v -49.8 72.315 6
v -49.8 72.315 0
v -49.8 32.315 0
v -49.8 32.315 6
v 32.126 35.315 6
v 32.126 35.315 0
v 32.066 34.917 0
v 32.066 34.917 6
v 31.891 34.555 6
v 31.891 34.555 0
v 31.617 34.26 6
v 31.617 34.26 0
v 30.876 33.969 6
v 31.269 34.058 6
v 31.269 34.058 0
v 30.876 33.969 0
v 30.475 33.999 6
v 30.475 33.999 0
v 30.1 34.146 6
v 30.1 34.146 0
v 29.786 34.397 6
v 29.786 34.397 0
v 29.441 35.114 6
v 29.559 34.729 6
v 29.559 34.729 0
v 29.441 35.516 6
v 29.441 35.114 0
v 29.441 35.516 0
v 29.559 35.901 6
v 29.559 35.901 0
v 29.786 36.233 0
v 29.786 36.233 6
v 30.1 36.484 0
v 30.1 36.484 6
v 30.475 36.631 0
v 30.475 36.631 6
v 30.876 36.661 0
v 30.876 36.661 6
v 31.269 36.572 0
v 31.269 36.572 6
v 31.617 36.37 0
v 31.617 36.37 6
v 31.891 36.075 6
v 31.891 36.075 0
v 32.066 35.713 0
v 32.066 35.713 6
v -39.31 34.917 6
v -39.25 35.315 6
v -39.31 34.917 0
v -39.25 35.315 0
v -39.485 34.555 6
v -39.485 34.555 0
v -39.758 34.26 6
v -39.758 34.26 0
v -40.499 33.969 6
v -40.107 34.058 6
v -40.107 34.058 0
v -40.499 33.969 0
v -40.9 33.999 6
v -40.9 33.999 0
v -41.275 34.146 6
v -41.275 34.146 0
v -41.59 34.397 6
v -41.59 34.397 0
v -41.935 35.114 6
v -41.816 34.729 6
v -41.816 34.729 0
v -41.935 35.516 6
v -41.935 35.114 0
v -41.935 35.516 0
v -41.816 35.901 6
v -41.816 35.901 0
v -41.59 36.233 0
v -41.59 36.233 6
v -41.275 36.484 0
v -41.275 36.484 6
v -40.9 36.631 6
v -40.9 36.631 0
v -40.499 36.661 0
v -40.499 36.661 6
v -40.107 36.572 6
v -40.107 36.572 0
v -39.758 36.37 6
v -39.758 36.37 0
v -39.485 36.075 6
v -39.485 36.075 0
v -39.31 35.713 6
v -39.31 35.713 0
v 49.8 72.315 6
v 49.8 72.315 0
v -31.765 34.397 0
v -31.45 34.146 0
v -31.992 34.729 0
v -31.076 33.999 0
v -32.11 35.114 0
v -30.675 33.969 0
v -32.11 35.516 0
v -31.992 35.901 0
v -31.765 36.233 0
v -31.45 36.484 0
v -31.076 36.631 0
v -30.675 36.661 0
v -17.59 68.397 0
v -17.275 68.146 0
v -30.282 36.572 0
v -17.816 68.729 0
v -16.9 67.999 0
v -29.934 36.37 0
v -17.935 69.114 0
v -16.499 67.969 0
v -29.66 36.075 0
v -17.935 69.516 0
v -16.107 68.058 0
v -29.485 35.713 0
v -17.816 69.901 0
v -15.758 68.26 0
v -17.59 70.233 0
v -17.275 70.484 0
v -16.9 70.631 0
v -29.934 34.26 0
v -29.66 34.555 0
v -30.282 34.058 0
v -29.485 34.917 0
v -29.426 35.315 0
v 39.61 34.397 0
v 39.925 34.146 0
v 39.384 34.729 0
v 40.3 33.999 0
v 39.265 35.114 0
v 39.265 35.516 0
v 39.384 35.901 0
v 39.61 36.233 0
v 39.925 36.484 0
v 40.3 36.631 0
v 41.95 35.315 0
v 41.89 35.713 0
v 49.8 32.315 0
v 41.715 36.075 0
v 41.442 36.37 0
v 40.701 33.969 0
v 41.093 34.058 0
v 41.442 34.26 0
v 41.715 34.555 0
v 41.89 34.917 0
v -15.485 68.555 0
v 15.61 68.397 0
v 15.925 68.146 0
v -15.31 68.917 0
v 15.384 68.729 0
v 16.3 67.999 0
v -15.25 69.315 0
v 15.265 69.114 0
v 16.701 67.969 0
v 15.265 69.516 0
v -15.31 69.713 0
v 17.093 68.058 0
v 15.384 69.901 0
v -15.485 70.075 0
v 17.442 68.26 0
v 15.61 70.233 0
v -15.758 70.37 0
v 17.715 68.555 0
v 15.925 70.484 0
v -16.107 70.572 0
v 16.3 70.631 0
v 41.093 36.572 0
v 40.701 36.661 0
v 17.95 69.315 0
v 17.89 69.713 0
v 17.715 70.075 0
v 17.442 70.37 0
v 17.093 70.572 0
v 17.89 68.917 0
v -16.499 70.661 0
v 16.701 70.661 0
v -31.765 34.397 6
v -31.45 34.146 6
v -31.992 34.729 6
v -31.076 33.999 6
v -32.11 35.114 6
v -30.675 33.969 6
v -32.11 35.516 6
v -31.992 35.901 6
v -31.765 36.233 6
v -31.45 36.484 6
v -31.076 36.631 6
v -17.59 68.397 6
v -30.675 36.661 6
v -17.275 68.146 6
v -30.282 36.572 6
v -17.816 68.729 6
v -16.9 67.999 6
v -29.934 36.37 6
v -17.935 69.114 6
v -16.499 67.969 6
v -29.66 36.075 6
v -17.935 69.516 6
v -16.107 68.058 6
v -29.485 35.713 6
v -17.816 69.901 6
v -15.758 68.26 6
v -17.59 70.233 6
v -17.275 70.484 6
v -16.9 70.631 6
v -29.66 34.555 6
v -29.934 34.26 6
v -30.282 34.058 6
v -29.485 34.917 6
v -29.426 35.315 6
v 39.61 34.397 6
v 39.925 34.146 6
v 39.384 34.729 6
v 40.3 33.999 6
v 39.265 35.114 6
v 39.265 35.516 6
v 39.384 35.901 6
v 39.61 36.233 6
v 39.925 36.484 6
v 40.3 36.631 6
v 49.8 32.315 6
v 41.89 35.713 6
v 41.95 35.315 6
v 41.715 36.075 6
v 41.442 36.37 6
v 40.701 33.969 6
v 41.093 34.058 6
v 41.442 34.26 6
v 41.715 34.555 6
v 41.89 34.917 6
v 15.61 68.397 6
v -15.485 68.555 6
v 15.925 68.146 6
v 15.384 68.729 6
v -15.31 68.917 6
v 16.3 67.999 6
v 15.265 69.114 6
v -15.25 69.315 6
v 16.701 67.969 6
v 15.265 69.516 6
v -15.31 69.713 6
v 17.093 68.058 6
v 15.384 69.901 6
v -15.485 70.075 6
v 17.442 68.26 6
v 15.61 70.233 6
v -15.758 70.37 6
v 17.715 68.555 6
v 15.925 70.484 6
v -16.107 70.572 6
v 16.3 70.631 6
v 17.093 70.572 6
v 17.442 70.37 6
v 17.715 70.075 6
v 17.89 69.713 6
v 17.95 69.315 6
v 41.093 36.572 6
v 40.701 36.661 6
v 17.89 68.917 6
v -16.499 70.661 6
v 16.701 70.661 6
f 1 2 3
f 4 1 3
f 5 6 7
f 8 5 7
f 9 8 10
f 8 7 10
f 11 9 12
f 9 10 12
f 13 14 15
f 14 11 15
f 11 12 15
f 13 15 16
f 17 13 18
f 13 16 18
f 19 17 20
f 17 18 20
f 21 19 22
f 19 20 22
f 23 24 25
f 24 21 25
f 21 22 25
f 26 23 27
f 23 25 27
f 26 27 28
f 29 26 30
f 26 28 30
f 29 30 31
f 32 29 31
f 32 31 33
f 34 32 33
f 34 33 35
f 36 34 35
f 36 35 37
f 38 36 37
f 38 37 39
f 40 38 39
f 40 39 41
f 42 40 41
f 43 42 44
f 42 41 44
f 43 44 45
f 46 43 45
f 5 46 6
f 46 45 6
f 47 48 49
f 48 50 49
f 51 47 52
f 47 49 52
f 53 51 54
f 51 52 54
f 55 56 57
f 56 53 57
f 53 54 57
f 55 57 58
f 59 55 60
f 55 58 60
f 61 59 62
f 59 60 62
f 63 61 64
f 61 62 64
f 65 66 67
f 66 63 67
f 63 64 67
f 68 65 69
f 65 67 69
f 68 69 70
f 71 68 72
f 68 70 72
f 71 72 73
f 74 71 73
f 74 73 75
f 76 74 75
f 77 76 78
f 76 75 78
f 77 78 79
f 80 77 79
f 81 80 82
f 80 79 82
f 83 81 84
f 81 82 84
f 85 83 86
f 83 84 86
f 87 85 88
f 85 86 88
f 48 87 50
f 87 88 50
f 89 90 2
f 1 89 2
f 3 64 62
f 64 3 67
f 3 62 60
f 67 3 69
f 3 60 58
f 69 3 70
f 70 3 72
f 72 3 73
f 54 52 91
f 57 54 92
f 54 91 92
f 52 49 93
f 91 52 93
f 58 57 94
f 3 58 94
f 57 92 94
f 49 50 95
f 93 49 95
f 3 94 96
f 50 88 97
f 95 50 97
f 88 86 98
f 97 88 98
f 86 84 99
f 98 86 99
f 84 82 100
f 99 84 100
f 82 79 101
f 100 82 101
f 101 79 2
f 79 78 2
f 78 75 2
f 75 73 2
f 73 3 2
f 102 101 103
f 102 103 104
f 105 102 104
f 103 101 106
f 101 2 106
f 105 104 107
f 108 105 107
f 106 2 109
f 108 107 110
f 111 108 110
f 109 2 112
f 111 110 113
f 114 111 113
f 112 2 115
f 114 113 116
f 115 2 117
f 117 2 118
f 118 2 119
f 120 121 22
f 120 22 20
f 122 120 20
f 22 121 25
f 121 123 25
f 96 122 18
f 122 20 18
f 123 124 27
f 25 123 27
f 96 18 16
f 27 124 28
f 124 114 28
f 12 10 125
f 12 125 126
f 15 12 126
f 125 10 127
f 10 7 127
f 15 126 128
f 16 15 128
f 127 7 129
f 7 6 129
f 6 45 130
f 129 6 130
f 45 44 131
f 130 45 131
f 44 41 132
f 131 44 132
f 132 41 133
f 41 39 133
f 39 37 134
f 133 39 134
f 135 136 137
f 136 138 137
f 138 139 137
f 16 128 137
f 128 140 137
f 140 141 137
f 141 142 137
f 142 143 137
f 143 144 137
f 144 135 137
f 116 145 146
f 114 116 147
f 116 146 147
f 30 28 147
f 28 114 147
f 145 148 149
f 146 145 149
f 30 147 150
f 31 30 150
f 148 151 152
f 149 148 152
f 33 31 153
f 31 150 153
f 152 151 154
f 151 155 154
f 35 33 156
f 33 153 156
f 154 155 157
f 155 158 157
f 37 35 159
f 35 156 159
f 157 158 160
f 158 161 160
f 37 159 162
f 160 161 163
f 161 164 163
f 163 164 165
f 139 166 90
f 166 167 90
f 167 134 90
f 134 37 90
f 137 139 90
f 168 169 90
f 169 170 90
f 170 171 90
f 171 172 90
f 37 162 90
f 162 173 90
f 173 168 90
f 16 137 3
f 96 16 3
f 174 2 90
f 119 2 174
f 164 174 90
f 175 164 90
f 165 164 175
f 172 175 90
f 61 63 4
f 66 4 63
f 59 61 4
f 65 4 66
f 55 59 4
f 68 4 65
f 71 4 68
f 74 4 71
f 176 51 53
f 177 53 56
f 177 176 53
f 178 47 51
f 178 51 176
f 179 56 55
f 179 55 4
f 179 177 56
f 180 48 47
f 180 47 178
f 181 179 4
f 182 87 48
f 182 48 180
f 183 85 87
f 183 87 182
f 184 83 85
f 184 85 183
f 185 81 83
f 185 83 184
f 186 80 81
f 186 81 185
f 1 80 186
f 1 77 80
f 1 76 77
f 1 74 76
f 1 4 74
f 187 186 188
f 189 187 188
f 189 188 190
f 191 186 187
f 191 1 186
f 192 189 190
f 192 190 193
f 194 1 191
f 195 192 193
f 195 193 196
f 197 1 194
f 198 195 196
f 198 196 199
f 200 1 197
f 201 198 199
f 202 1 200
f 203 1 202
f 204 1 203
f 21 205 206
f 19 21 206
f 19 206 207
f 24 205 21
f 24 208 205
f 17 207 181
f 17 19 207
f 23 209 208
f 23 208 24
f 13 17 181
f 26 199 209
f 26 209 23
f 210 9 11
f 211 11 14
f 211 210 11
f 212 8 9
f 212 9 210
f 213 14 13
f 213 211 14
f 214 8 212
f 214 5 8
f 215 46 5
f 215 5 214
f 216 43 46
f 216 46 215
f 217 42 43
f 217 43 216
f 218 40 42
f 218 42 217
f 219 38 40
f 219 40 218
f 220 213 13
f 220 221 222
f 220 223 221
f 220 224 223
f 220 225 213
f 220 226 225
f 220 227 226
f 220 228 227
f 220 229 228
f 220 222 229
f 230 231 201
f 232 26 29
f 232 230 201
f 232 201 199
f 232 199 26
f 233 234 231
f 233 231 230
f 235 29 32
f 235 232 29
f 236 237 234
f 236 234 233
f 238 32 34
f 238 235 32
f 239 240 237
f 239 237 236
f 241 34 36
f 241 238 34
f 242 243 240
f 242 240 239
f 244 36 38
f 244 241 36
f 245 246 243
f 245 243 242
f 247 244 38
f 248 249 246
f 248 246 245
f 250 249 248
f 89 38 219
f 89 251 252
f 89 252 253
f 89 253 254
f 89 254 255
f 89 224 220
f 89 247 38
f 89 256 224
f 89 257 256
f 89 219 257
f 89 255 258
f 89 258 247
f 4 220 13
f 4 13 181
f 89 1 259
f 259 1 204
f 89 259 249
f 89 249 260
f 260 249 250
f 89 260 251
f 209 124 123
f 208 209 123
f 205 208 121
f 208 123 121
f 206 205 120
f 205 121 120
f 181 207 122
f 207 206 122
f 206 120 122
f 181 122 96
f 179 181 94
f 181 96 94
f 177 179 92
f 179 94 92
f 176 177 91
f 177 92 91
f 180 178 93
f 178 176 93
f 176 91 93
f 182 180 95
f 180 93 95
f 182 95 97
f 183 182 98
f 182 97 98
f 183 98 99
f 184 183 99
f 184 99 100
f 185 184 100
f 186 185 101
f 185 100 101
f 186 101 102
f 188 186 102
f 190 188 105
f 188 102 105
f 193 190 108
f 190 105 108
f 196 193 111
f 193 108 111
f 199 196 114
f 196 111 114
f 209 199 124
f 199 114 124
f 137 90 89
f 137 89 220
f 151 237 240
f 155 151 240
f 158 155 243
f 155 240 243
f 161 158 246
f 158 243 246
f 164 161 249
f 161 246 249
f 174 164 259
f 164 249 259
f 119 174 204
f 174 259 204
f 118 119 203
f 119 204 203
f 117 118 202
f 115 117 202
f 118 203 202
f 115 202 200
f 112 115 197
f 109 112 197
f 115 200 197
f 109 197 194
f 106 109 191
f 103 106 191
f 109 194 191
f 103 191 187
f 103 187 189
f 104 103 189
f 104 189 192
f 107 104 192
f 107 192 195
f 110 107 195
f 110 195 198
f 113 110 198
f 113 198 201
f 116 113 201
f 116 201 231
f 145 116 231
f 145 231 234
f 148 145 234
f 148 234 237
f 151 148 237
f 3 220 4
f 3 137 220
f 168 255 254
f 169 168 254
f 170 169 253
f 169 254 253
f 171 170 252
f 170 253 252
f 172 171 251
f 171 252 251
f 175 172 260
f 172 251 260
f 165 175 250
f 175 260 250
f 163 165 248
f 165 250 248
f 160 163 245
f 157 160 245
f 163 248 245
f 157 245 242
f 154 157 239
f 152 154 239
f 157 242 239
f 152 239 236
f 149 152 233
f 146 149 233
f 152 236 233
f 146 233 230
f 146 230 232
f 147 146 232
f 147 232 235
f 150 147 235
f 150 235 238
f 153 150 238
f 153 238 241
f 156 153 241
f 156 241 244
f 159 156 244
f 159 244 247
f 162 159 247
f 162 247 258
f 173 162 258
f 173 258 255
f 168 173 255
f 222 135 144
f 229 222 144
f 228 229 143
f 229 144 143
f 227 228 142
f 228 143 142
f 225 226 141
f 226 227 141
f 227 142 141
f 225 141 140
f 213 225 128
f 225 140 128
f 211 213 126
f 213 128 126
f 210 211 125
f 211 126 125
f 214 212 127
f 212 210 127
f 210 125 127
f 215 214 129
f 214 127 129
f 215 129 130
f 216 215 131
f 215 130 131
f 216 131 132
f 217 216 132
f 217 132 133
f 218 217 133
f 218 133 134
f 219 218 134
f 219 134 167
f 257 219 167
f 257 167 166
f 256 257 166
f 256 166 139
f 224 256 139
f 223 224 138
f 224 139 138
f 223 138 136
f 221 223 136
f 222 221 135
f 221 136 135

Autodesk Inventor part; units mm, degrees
ref_plane "YZ Plane" through (0, 0, 0) normal (1, 0, 0) x (0, 1, 0)
ref_plane "XZ Plane" through (0, 0, 0) normal (0, 1, 0) x (-1, 0, 0)
ref_plane "XY Plane" through (0, 0, 0) normal (0, 0, 1) x (1, 0, 0)
ref_plane "작업 평면1" through (0, 0, -13) normal (0, 0, 1) x (1, 0, 0)
ref_plane "작업 평면2" through (0, 0, 0) normal (0, 0, 1) x (1, 0, 0)
sketch "스케치2" plane through (0, 0, 0) normal (0, 0, 1) x (1, 0, 0)
  circle A0 centre (-40.6, 35.315) radius 1.35 projected
  circle A1 centre (-30.7755, 35.315) radius 1.35 projected
  line L0 (-22.2, 38.315) -> (-49.8, 38.315) projected
  line L1 (-49.8, 38.315) -> (-49.8, 32.315) projected
  line L2 (-22.2, 32.315) -> (-49.8, 32.315) projected
  line L3 (-22.2, 38.315) -> (-22.2, 32.315) projected
  circle A2 centre (40.6, 35.315) radius 1.35 projected
  circle A3 centre (30.7755, 35.315) radius 1.35 projected
  line L4 (22.2, 38.315) -> (49.8, 38.315) projected
  line L5 (22.2, 38.315) -> (22.2, 32.315) projected
  line L6 (22.2, 32.315) -> (49.8, 32.315) projected
  line L7 (49.8, 38.315) -> (49.8, 32.315) projected
  line L8 (-49.8, 32.315) -> (49.8, 32.315)
  line L9 (49.8, 32.315) -> (49.8, 72.315)
  line L10 (49.8, 72.315) -> (-49.8, 72.315)
  line L11 (-49.8, 72.315) -> (-49.8, 32.315)
  point P0 (0, 0)
  dimension "d3" = 40
extrude "돌출2" add sketch "스케치2" along normal blind 6
sketch "스케치3" plane through (0, 0, 6) normal (0, 0, 1) x (1, 0, 0)
  line L0 (-49.8, 32.315) -> (49.8, 32.315) projected
  line L1 (49.8, 32.315) -> (49.8, 72.315) projected
  line L2 (49.8, 72.315) -> (-49.8, 72.315) projected
  line L3 (-49.8, 72.315) -> (-49.8, 32.315) projected
  circle A0 centre (40.6, 35.315) radius 1.35 projected
  circle A1 centre (30.7755, 35.315) radius 1.35 projected
  circle A2 centre (-40.6, 35.315) radius 1.35 projected
  circle A3 centre (-30.7755, 35.315) radius 1.35 projected
  line L4 (46.167, 64.315) -> (-44.5, 64.315) projected
  line L5 (49.5, 64.315) -> (46.167, 64.315) projected
  line L6 (-51.5, 64.315) -> (-44.5, 64.315) projected
  line L7 (-49.8, 72.315) -> (-49.8, 66.315)
  line L8 (-49.8, 66.315) -> (49.8, 66.315)
  line L9 (49.8, 66.315) -> (49.8, 72.315)
  line L10 (49.8, 72.315) -> (-49.8, 72.315)
  line L11 (49.8, 72.315) -> (16.6, 72.315)
  line L12 (16.6, 72.315) -> (-16.6, 72.315)
  line L13 (-16.6, 72.315) -> (-16.6, 66.315)
  line L14 (16.6, 72.315) -> (16.6, 66.315)
  circle A4 centre (16.6, 69.315) radius 1.35
  circle A5 centre (-16.6, 69.315) radius 1.35
  point P0 (0, 0)
  point P1 (0, 72.315)
  dimension "d6" = 6
  dimension "d7" = 33.2
  dimension "d8" = 33.2
  dimension "d9" = 2.7
  dimension "d10" = 2.7
extrude "돌출3" cut sketch "스케치3" against normal blind 6 contours A4 L14 | L14 A4 | A5 L13 | L13 A5
properties part number "_battery_adt"
